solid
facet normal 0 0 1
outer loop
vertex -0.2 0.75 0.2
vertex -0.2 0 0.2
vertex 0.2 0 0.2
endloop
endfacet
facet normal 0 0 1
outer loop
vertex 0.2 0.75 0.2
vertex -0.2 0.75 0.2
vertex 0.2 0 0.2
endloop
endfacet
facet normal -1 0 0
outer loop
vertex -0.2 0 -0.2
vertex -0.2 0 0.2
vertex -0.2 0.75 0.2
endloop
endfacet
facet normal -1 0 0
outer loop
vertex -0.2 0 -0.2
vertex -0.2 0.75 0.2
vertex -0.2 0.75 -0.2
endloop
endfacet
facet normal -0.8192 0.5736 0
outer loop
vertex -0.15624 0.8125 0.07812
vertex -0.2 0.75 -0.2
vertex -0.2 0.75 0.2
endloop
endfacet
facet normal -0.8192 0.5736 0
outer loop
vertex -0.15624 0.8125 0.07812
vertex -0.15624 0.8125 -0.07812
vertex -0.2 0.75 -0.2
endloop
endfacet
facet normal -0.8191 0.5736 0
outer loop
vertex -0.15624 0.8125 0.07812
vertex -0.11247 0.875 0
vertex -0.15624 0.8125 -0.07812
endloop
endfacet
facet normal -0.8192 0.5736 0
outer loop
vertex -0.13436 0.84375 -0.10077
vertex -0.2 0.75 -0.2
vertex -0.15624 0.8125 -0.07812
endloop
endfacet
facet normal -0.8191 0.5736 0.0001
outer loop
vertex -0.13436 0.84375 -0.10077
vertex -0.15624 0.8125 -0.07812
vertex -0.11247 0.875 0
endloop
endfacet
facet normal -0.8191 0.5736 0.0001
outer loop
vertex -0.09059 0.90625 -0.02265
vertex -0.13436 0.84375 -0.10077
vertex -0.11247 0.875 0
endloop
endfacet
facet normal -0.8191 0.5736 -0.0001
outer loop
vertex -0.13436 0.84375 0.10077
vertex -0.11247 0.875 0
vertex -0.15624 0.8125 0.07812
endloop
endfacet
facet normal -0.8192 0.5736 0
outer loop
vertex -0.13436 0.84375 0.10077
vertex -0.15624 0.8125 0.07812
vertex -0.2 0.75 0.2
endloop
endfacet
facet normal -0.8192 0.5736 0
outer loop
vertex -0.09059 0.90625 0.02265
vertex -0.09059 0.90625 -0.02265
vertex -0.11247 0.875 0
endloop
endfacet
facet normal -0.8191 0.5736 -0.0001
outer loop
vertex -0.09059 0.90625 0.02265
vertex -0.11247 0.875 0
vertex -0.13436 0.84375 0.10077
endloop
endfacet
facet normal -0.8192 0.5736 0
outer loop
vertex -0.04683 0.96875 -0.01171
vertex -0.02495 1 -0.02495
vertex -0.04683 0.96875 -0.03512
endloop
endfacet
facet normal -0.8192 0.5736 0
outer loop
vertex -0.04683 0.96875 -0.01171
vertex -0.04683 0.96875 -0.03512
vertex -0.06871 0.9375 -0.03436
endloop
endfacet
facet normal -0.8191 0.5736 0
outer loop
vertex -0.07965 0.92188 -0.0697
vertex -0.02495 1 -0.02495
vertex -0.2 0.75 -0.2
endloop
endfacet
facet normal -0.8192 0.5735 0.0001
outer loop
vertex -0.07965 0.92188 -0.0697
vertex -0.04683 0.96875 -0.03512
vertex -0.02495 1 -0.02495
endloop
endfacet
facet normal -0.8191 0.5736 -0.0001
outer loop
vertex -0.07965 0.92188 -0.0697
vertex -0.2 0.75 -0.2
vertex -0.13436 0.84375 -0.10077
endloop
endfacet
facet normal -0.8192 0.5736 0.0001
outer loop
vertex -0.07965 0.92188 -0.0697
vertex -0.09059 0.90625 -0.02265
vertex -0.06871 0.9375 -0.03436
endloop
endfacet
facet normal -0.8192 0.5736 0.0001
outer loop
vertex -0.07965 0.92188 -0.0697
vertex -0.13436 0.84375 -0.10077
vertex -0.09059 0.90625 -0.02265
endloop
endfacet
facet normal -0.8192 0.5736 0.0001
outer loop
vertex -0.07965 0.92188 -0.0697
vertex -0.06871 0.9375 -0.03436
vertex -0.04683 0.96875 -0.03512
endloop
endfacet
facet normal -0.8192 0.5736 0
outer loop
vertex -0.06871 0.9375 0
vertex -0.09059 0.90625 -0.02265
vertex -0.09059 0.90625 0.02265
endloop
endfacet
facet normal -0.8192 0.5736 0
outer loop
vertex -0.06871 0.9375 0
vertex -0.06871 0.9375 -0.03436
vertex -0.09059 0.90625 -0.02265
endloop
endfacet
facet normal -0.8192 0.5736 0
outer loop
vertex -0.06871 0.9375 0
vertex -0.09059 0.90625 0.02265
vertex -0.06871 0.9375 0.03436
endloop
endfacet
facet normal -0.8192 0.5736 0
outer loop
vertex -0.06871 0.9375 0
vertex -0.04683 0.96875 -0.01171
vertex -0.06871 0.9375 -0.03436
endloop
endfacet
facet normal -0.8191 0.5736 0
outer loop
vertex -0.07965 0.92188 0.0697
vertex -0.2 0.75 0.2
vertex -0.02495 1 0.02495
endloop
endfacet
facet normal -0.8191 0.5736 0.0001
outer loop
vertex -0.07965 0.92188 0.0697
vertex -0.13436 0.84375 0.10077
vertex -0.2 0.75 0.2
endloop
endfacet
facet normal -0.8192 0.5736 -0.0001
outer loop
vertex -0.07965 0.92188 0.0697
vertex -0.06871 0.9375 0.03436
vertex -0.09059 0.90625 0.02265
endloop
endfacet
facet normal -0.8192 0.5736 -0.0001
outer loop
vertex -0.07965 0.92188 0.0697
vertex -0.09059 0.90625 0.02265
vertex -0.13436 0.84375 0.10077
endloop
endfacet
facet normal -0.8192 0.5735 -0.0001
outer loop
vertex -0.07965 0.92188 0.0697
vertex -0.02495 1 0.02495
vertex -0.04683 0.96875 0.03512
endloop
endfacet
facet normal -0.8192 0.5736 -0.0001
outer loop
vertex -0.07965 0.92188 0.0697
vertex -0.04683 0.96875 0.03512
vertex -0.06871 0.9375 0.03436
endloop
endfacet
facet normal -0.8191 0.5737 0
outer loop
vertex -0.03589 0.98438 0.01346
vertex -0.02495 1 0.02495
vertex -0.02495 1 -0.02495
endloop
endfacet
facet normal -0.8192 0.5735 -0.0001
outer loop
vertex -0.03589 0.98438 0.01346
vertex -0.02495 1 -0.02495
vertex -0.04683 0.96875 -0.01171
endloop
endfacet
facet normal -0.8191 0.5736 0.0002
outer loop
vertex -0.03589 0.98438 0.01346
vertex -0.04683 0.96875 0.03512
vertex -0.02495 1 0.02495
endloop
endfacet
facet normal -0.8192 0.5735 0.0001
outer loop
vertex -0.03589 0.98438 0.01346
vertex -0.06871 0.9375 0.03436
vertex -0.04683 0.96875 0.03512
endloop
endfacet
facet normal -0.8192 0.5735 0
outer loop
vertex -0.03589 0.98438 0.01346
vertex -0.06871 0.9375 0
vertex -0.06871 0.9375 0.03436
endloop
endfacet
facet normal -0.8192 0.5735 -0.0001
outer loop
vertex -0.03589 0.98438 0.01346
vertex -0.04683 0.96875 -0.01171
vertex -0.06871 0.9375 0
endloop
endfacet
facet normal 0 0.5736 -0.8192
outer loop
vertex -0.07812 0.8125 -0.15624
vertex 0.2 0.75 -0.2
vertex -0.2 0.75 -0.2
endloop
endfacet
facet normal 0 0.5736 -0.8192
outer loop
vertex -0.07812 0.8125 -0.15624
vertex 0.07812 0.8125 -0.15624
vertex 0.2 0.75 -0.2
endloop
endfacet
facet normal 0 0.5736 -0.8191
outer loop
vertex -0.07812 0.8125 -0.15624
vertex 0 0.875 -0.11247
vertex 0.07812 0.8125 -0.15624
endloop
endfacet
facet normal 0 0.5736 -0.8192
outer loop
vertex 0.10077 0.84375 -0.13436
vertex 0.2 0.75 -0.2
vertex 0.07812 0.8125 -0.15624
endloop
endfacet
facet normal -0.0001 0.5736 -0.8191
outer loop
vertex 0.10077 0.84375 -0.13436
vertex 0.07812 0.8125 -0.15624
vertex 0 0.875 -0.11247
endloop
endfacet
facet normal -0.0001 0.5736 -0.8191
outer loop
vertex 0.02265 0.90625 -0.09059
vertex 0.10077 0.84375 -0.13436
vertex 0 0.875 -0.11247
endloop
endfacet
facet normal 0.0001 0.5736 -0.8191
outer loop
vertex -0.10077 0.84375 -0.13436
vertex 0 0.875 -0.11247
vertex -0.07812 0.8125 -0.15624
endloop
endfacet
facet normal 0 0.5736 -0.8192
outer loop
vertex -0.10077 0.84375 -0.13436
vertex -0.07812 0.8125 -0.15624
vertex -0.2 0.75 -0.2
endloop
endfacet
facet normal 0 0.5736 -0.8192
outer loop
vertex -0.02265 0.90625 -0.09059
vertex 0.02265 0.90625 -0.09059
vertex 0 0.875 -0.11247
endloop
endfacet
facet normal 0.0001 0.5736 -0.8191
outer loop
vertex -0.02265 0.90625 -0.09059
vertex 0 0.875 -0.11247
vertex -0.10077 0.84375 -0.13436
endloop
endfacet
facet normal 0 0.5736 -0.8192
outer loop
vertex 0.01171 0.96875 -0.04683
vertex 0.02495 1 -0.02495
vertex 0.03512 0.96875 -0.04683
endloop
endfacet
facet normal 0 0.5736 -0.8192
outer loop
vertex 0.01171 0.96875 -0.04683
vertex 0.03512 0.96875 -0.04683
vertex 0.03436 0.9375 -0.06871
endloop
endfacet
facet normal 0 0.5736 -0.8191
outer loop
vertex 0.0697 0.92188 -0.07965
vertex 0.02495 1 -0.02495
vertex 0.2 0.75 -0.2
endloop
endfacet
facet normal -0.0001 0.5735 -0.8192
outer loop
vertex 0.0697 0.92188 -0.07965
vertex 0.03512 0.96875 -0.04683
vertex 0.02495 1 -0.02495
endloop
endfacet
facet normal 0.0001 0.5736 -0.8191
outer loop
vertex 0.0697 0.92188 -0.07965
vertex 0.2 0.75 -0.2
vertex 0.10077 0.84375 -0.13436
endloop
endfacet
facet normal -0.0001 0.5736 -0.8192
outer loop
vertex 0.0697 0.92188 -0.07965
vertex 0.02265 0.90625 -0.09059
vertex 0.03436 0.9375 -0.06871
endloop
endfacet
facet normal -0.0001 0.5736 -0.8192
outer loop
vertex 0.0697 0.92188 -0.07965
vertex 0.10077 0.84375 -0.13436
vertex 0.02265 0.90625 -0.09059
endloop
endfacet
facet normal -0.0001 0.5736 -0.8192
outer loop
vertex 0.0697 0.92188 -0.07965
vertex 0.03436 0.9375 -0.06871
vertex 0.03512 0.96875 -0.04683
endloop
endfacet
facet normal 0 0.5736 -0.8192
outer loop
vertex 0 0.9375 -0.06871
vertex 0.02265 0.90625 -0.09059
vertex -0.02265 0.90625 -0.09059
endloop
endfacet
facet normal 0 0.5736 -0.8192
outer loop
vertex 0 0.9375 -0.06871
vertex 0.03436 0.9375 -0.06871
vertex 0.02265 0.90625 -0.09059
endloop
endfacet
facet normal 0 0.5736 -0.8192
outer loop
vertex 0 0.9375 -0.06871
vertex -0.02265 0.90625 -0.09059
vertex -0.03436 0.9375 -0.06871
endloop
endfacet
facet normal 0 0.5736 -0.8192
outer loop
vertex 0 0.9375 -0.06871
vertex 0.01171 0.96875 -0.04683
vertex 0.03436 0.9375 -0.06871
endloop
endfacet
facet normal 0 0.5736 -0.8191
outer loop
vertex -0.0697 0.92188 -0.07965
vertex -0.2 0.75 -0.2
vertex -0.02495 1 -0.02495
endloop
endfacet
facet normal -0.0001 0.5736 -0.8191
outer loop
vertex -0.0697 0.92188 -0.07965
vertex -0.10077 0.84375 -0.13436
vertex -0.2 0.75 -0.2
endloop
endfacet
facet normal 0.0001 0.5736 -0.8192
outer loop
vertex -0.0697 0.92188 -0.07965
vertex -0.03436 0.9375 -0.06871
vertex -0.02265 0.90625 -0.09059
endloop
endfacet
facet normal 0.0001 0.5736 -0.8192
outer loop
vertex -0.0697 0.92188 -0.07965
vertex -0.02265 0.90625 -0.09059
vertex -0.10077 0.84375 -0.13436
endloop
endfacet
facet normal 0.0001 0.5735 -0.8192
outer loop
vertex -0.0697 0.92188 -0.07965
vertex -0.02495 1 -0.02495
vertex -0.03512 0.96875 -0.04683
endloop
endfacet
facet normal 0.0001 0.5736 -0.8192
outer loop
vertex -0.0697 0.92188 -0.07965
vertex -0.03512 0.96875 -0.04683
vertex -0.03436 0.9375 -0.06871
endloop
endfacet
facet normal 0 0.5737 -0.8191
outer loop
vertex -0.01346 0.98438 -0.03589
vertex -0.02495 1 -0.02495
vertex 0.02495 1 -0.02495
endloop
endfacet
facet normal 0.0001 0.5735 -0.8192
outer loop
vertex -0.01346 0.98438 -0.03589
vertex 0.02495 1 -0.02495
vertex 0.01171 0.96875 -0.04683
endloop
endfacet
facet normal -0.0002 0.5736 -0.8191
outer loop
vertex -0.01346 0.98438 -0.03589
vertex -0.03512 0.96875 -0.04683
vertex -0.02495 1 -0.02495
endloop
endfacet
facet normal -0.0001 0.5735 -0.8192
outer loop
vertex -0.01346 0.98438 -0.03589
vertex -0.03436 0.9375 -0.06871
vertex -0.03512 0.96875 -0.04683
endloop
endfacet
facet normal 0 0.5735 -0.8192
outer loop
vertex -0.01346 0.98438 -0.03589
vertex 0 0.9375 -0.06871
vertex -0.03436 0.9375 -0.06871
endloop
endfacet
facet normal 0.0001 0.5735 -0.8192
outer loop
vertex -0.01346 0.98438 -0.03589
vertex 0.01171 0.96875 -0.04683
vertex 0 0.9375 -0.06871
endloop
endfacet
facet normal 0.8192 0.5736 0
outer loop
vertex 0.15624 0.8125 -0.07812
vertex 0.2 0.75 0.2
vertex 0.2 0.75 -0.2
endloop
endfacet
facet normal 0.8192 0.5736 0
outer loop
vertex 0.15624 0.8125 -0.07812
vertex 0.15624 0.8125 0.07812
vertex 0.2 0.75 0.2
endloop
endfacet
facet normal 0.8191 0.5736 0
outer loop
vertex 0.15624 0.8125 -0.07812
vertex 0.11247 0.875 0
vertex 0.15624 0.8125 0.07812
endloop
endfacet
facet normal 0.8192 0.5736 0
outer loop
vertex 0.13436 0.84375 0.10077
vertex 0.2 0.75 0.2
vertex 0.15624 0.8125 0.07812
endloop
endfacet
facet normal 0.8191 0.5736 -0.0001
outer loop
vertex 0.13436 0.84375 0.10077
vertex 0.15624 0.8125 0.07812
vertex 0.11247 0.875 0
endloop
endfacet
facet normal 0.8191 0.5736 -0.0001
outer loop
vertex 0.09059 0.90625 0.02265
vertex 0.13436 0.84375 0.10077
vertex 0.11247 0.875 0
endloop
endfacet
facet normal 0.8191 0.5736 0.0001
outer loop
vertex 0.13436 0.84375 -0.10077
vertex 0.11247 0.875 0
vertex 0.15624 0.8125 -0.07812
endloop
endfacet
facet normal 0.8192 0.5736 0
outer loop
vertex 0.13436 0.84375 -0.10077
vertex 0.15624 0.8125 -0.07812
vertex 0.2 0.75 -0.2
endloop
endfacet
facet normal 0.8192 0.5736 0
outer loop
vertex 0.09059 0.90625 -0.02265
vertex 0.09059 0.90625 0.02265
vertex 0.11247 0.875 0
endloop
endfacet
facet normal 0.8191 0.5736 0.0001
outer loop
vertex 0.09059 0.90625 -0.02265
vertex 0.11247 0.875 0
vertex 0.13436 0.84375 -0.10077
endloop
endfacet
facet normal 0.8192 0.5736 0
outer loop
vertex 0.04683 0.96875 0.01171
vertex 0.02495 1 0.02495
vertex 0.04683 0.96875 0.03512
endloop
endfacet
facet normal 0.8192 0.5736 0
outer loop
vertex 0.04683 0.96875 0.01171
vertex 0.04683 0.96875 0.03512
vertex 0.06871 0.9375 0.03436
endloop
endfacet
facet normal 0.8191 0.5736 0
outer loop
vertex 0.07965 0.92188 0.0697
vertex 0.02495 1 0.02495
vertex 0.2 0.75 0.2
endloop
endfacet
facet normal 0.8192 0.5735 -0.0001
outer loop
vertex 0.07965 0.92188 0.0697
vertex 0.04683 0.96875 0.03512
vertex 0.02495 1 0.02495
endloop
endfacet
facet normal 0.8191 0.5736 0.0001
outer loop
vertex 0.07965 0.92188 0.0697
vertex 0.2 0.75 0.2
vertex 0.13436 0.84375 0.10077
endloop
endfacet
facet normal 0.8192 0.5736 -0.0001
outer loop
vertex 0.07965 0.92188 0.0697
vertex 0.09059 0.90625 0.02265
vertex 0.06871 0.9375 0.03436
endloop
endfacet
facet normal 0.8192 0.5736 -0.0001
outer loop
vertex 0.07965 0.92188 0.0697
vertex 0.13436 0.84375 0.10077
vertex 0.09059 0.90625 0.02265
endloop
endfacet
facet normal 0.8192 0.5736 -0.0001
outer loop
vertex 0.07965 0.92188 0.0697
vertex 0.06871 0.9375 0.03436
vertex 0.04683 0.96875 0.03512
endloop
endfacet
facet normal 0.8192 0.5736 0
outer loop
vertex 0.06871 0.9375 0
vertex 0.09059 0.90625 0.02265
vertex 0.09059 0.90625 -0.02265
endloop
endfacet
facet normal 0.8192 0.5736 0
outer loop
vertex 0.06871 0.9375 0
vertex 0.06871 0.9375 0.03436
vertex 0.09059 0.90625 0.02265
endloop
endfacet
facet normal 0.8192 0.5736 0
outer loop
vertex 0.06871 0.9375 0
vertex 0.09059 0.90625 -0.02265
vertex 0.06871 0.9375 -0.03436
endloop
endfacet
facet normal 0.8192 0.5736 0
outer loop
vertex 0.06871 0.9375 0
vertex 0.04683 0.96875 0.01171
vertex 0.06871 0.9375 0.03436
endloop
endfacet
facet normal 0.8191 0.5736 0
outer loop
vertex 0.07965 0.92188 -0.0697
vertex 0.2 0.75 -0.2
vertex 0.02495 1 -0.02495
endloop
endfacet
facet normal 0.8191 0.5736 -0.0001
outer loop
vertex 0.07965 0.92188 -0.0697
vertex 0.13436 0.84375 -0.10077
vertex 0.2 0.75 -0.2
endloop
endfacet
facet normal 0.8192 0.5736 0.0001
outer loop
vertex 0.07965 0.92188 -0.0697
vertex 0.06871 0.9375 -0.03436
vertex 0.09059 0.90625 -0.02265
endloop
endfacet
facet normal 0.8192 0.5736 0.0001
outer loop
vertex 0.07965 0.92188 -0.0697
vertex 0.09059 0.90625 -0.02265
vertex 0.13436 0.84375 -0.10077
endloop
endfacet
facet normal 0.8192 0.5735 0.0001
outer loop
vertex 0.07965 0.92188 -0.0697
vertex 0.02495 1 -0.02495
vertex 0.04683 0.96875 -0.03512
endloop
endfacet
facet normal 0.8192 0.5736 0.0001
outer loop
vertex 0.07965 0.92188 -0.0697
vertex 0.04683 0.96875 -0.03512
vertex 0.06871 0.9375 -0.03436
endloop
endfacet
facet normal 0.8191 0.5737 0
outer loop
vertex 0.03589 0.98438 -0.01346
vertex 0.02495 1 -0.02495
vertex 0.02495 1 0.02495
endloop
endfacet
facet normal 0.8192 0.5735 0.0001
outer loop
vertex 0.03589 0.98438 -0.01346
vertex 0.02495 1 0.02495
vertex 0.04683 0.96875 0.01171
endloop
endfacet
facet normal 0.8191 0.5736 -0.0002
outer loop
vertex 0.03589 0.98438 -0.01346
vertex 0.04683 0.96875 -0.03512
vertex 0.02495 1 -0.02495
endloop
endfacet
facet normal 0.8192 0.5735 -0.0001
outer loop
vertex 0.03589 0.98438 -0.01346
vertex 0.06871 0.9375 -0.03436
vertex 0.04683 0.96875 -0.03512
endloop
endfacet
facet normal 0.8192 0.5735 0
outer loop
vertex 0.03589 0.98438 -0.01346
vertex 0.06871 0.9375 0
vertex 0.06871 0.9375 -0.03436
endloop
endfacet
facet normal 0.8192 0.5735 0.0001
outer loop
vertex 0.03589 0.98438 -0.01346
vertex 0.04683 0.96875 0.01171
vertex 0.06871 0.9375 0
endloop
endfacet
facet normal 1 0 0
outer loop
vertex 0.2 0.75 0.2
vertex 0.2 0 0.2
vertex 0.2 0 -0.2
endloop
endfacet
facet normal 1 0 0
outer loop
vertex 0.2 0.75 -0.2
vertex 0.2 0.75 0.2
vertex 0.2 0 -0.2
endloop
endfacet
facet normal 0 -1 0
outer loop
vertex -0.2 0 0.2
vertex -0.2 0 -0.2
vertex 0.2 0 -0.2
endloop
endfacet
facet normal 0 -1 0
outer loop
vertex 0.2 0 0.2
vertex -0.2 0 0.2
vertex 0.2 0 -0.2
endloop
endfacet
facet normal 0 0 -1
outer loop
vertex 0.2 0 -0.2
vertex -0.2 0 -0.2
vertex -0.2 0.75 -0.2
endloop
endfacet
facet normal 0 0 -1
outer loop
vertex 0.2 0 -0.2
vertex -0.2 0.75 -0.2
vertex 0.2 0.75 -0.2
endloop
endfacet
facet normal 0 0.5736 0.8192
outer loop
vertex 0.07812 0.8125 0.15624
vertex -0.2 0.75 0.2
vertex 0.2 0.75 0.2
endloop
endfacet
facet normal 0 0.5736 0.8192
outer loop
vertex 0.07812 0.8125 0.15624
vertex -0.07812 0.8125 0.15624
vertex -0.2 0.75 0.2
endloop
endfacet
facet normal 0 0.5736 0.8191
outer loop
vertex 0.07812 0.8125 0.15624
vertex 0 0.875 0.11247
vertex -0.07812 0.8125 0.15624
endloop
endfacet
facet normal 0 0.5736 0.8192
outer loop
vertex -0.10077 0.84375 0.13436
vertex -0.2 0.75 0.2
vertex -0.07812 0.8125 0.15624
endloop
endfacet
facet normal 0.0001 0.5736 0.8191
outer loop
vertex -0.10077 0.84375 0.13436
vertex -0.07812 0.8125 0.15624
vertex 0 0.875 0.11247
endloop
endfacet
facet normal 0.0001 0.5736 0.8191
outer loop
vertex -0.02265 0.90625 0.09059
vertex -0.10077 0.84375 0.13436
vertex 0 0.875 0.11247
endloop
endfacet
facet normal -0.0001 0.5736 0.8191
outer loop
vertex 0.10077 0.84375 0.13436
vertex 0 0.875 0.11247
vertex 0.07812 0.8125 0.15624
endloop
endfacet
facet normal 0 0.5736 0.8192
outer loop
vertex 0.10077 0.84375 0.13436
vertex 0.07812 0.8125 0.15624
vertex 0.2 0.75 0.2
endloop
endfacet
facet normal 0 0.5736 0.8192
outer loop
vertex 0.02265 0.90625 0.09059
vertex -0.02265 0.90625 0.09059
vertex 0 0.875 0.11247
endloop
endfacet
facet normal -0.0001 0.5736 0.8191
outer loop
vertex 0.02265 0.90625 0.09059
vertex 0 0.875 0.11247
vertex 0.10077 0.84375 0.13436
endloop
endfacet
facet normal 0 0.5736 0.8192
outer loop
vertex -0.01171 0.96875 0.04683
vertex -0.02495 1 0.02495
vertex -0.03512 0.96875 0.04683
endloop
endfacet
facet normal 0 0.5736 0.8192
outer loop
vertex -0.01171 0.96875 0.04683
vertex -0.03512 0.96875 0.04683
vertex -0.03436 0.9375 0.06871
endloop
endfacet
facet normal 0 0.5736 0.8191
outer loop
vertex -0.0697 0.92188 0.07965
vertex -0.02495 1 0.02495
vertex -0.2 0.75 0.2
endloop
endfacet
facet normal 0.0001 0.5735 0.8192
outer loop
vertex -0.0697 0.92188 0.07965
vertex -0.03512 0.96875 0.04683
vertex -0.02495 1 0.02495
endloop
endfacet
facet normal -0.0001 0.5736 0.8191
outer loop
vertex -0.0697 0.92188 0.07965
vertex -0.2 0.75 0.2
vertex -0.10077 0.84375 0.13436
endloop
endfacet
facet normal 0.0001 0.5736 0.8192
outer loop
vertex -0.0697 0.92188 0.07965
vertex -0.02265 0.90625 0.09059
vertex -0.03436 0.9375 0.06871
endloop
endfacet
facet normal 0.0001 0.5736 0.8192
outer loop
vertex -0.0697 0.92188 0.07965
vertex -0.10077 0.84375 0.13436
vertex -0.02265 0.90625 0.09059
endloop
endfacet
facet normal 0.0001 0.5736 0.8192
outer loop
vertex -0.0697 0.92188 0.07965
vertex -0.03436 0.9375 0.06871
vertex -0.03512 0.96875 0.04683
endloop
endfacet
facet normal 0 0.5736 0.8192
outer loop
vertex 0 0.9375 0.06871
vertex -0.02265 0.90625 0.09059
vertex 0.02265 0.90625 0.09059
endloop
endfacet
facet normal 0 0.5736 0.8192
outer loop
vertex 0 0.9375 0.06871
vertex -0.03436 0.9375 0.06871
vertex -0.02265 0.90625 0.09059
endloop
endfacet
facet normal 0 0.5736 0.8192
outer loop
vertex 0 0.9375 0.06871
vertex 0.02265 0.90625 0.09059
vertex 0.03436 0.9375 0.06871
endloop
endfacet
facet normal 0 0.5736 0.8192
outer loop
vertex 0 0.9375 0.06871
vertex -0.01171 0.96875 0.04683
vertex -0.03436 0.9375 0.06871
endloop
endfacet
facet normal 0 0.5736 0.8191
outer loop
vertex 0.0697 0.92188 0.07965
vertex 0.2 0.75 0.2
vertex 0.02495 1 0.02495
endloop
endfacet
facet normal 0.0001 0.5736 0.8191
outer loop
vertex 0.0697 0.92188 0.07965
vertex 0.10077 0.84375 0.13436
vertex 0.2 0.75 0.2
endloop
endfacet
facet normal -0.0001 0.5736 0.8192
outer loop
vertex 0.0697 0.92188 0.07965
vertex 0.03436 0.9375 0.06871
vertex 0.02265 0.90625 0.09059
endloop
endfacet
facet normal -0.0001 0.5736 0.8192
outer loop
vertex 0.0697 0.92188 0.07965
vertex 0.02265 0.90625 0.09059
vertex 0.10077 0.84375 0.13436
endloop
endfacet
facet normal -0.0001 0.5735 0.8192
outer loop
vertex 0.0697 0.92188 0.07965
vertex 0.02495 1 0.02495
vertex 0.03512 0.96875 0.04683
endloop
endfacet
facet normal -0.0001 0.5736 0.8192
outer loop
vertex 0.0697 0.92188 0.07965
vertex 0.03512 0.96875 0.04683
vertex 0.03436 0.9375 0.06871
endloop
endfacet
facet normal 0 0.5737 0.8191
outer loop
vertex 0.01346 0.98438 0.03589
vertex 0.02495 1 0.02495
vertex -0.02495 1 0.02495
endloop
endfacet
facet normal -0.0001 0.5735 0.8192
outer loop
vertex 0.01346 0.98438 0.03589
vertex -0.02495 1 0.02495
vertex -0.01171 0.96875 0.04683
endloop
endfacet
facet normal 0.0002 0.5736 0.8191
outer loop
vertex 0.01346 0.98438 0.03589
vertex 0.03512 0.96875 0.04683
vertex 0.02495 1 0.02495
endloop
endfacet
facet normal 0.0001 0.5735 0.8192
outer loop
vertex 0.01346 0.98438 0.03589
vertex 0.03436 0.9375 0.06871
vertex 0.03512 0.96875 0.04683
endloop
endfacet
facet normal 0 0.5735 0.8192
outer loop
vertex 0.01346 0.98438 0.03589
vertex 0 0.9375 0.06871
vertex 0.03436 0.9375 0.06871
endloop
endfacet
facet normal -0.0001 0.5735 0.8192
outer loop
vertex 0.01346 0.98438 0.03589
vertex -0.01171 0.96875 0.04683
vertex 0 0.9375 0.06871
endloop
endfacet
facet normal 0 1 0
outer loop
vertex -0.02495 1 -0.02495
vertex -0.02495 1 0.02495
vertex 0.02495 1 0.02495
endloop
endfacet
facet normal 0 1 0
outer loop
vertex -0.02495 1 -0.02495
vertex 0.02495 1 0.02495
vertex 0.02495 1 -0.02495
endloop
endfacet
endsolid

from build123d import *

# Parameters (mm, degrees)
SKETCH1_W           = 0.4
SKETCH1_H           = 0.4
BOSS_EXTRUDE1_DEPTH = 0.75
SKETCH2_W           = 0.4
SKETCH2_H           = 0.4
BOSS_EXTRUDE2_DEPTH = 0.25
BOSS_EXTRUDE2_TAPER = 35


with BuildPart() as part:
    # Sketch1 → Boss-Extrude1 (new body)
    with BuildSketch(Plane(origin=(0, 0, 0), x_dir=(1, 0, 0), z_dir=(0, 1, 0))):
        Rectangle(SKETCH1_W, SKETCH1_H)
    extrude(amount=BOSS_EXTRUDE1_DEPTH)

    # Sketch2 → Boss-Extrude2 (add)
    with BuildSketch(Plane(origin=(0, 0.75, 0), x_dir=(1, 0, 0), z_dir=(0, 1, 0))):
        Rectangle(SKETCH2_W, SKETCH2_H)
    extrude(amount=BOSS_EXTRUDE2_DEPTH, taper=BOSS_EXTRUDE2_TAPER)


solid = part.part
